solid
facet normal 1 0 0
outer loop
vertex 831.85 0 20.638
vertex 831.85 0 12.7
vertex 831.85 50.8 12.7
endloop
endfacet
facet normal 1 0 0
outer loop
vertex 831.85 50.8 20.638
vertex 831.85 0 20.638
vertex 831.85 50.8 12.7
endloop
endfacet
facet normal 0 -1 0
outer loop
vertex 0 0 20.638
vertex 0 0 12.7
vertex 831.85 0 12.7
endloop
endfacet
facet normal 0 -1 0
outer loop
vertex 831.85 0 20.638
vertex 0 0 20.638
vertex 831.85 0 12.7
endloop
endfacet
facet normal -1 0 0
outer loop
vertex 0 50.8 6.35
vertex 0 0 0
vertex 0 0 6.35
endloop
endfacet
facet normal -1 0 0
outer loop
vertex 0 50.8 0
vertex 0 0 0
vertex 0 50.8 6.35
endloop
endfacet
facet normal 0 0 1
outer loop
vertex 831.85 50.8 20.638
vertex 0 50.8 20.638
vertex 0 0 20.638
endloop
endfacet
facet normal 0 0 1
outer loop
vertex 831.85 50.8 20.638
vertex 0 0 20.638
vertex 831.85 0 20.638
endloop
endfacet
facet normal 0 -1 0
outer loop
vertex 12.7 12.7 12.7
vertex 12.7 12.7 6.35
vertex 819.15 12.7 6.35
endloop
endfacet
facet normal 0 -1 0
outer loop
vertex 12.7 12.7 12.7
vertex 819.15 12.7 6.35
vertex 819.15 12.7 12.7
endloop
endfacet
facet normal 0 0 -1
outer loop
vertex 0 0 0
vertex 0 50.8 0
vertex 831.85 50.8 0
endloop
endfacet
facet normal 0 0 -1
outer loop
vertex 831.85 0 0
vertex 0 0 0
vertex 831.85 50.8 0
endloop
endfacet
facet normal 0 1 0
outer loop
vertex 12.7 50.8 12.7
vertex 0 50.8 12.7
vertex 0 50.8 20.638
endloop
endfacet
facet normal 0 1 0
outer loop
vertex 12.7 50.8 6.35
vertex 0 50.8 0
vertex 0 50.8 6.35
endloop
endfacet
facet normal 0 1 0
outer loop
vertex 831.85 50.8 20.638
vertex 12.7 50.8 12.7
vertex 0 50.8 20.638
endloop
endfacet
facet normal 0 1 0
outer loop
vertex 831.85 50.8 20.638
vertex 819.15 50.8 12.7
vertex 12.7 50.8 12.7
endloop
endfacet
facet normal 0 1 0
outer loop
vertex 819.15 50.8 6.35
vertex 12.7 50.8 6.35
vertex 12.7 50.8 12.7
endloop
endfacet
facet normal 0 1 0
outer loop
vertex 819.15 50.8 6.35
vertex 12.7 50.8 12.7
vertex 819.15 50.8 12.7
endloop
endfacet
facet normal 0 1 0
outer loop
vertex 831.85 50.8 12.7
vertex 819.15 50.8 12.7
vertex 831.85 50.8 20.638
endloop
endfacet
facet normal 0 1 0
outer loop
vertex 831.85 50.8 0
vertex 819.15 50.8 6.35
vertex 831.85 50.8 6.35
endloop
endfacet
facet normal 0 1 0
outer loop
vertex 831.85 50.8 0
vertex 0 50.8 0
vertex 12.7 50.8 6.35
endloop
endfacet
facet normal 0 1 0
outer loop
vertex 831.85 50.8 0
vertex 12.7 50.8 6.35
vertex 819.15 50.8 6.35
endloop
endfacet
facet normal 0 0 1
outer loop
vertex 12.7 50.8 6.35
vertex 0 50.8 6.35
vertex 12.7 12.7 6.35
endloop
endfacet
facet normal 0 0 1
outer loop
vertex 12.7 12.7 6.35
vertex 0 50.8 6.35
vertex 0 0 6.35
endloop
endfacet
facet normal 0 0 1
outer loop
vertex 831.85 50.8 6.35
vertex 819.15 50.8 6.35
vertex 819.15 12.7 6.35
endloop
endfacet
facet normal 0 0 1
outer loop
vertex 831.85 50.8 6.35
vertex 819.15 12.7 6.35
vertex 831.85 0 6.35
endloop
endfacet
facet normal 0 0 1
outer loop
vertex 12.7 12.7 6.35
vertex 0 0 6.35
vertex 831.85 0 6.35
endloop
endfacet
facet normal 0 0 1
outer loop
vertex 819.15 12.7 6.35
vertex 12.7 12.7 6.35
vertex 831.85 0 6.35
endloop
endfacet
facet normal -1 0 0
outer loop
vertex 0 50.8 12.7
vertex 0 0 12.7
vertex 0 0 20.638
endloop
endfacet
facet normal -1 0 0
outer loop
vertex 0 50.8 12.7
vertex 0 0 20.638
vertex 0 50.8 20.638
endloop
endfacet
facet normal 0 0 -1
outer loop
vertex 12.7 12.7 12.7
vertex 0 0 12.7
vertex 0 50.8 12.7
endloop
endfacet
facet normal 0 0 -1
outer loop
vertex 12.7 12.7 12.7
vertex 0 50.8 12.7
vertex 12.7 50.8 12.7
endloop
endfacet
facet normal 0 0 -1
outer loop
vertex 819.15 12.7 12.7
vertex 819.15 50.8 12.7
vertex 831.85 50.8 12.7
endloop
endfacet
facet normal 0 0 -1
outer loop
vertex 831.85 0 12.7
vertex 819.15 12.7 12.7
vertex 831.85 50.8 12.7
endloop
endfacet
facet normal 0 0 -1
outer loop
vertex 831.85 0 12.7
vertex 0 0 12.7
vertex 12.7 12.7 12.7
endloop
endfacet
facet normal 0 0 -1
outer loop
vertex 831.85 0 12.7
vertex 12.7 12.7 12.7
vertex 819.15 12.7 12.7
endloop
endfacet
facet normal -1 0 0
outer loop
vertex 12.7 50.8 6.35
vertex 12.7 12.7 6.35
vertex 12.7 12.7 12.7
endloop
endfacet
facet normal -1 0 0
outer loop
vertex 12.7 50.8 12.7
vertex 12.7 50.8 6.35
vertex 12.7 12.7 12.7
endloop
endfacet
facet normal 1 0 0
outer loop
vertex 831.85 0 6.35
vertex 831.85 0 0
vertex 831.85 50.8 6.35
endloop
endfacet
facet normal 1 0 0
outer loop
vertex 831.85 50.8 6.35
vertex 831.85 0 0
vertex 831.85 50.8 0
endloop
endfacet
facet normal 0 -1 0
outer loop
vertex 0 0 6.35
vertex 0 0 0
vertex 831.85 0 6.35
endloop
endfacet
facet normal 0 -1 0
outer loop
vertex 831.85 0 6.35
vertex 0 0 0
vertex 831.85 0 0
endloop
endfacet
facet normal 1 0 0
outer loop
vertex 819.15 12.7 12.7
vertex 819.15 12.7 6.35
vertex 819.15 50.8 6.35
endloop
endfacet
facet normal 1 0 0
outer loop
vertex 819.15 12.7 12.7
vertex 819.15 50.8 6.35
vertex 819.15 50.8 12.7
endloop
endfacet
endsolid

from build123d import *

# Parameters (mm, degrees)
F0_W     = 831.85
F0_H     = 50.8
F1_DEPTH = 20.6375
F2_W     = 12.7
F2_H     = 6.35
F3_DEPTH = 831.85
F4_W     = 12.7
F4_H     = 6.35
F5_DEPTH = 50.801


with BuildPart() as f1:
    # F0 (on Top) → F1 (new body)
    with BuildSketch(Plane.XY):
        with Locations((415.925, 25.4)):
            Rectangle(F0_W, F0_H)
    extrude(amount=F1_DEPTH)

    # F2 (on Right) → F3 (cut, through all)
    with BuildSketch(Plane.YZ):
        with Locations((6.35, 9.525)):
            Rectangle(F2_W, F2_H)
    extrude(amount=F3_DEPTH, mode=Mode.SUBTRACT)

    # F4 (on Front) → F5 (cut, through all)
    with BuildSketch(Plane.XZ):
        with Locations((6.35, 9.525)):
            Rectangle(F4_W, F4_H)
        with Locations((825.5, 9.525)):
            Rectangle(F4_W, F4_H)
    extrude(amount=-F5_DEPTH, mode=Mode.SUBTRACT)


solid = f1.part
